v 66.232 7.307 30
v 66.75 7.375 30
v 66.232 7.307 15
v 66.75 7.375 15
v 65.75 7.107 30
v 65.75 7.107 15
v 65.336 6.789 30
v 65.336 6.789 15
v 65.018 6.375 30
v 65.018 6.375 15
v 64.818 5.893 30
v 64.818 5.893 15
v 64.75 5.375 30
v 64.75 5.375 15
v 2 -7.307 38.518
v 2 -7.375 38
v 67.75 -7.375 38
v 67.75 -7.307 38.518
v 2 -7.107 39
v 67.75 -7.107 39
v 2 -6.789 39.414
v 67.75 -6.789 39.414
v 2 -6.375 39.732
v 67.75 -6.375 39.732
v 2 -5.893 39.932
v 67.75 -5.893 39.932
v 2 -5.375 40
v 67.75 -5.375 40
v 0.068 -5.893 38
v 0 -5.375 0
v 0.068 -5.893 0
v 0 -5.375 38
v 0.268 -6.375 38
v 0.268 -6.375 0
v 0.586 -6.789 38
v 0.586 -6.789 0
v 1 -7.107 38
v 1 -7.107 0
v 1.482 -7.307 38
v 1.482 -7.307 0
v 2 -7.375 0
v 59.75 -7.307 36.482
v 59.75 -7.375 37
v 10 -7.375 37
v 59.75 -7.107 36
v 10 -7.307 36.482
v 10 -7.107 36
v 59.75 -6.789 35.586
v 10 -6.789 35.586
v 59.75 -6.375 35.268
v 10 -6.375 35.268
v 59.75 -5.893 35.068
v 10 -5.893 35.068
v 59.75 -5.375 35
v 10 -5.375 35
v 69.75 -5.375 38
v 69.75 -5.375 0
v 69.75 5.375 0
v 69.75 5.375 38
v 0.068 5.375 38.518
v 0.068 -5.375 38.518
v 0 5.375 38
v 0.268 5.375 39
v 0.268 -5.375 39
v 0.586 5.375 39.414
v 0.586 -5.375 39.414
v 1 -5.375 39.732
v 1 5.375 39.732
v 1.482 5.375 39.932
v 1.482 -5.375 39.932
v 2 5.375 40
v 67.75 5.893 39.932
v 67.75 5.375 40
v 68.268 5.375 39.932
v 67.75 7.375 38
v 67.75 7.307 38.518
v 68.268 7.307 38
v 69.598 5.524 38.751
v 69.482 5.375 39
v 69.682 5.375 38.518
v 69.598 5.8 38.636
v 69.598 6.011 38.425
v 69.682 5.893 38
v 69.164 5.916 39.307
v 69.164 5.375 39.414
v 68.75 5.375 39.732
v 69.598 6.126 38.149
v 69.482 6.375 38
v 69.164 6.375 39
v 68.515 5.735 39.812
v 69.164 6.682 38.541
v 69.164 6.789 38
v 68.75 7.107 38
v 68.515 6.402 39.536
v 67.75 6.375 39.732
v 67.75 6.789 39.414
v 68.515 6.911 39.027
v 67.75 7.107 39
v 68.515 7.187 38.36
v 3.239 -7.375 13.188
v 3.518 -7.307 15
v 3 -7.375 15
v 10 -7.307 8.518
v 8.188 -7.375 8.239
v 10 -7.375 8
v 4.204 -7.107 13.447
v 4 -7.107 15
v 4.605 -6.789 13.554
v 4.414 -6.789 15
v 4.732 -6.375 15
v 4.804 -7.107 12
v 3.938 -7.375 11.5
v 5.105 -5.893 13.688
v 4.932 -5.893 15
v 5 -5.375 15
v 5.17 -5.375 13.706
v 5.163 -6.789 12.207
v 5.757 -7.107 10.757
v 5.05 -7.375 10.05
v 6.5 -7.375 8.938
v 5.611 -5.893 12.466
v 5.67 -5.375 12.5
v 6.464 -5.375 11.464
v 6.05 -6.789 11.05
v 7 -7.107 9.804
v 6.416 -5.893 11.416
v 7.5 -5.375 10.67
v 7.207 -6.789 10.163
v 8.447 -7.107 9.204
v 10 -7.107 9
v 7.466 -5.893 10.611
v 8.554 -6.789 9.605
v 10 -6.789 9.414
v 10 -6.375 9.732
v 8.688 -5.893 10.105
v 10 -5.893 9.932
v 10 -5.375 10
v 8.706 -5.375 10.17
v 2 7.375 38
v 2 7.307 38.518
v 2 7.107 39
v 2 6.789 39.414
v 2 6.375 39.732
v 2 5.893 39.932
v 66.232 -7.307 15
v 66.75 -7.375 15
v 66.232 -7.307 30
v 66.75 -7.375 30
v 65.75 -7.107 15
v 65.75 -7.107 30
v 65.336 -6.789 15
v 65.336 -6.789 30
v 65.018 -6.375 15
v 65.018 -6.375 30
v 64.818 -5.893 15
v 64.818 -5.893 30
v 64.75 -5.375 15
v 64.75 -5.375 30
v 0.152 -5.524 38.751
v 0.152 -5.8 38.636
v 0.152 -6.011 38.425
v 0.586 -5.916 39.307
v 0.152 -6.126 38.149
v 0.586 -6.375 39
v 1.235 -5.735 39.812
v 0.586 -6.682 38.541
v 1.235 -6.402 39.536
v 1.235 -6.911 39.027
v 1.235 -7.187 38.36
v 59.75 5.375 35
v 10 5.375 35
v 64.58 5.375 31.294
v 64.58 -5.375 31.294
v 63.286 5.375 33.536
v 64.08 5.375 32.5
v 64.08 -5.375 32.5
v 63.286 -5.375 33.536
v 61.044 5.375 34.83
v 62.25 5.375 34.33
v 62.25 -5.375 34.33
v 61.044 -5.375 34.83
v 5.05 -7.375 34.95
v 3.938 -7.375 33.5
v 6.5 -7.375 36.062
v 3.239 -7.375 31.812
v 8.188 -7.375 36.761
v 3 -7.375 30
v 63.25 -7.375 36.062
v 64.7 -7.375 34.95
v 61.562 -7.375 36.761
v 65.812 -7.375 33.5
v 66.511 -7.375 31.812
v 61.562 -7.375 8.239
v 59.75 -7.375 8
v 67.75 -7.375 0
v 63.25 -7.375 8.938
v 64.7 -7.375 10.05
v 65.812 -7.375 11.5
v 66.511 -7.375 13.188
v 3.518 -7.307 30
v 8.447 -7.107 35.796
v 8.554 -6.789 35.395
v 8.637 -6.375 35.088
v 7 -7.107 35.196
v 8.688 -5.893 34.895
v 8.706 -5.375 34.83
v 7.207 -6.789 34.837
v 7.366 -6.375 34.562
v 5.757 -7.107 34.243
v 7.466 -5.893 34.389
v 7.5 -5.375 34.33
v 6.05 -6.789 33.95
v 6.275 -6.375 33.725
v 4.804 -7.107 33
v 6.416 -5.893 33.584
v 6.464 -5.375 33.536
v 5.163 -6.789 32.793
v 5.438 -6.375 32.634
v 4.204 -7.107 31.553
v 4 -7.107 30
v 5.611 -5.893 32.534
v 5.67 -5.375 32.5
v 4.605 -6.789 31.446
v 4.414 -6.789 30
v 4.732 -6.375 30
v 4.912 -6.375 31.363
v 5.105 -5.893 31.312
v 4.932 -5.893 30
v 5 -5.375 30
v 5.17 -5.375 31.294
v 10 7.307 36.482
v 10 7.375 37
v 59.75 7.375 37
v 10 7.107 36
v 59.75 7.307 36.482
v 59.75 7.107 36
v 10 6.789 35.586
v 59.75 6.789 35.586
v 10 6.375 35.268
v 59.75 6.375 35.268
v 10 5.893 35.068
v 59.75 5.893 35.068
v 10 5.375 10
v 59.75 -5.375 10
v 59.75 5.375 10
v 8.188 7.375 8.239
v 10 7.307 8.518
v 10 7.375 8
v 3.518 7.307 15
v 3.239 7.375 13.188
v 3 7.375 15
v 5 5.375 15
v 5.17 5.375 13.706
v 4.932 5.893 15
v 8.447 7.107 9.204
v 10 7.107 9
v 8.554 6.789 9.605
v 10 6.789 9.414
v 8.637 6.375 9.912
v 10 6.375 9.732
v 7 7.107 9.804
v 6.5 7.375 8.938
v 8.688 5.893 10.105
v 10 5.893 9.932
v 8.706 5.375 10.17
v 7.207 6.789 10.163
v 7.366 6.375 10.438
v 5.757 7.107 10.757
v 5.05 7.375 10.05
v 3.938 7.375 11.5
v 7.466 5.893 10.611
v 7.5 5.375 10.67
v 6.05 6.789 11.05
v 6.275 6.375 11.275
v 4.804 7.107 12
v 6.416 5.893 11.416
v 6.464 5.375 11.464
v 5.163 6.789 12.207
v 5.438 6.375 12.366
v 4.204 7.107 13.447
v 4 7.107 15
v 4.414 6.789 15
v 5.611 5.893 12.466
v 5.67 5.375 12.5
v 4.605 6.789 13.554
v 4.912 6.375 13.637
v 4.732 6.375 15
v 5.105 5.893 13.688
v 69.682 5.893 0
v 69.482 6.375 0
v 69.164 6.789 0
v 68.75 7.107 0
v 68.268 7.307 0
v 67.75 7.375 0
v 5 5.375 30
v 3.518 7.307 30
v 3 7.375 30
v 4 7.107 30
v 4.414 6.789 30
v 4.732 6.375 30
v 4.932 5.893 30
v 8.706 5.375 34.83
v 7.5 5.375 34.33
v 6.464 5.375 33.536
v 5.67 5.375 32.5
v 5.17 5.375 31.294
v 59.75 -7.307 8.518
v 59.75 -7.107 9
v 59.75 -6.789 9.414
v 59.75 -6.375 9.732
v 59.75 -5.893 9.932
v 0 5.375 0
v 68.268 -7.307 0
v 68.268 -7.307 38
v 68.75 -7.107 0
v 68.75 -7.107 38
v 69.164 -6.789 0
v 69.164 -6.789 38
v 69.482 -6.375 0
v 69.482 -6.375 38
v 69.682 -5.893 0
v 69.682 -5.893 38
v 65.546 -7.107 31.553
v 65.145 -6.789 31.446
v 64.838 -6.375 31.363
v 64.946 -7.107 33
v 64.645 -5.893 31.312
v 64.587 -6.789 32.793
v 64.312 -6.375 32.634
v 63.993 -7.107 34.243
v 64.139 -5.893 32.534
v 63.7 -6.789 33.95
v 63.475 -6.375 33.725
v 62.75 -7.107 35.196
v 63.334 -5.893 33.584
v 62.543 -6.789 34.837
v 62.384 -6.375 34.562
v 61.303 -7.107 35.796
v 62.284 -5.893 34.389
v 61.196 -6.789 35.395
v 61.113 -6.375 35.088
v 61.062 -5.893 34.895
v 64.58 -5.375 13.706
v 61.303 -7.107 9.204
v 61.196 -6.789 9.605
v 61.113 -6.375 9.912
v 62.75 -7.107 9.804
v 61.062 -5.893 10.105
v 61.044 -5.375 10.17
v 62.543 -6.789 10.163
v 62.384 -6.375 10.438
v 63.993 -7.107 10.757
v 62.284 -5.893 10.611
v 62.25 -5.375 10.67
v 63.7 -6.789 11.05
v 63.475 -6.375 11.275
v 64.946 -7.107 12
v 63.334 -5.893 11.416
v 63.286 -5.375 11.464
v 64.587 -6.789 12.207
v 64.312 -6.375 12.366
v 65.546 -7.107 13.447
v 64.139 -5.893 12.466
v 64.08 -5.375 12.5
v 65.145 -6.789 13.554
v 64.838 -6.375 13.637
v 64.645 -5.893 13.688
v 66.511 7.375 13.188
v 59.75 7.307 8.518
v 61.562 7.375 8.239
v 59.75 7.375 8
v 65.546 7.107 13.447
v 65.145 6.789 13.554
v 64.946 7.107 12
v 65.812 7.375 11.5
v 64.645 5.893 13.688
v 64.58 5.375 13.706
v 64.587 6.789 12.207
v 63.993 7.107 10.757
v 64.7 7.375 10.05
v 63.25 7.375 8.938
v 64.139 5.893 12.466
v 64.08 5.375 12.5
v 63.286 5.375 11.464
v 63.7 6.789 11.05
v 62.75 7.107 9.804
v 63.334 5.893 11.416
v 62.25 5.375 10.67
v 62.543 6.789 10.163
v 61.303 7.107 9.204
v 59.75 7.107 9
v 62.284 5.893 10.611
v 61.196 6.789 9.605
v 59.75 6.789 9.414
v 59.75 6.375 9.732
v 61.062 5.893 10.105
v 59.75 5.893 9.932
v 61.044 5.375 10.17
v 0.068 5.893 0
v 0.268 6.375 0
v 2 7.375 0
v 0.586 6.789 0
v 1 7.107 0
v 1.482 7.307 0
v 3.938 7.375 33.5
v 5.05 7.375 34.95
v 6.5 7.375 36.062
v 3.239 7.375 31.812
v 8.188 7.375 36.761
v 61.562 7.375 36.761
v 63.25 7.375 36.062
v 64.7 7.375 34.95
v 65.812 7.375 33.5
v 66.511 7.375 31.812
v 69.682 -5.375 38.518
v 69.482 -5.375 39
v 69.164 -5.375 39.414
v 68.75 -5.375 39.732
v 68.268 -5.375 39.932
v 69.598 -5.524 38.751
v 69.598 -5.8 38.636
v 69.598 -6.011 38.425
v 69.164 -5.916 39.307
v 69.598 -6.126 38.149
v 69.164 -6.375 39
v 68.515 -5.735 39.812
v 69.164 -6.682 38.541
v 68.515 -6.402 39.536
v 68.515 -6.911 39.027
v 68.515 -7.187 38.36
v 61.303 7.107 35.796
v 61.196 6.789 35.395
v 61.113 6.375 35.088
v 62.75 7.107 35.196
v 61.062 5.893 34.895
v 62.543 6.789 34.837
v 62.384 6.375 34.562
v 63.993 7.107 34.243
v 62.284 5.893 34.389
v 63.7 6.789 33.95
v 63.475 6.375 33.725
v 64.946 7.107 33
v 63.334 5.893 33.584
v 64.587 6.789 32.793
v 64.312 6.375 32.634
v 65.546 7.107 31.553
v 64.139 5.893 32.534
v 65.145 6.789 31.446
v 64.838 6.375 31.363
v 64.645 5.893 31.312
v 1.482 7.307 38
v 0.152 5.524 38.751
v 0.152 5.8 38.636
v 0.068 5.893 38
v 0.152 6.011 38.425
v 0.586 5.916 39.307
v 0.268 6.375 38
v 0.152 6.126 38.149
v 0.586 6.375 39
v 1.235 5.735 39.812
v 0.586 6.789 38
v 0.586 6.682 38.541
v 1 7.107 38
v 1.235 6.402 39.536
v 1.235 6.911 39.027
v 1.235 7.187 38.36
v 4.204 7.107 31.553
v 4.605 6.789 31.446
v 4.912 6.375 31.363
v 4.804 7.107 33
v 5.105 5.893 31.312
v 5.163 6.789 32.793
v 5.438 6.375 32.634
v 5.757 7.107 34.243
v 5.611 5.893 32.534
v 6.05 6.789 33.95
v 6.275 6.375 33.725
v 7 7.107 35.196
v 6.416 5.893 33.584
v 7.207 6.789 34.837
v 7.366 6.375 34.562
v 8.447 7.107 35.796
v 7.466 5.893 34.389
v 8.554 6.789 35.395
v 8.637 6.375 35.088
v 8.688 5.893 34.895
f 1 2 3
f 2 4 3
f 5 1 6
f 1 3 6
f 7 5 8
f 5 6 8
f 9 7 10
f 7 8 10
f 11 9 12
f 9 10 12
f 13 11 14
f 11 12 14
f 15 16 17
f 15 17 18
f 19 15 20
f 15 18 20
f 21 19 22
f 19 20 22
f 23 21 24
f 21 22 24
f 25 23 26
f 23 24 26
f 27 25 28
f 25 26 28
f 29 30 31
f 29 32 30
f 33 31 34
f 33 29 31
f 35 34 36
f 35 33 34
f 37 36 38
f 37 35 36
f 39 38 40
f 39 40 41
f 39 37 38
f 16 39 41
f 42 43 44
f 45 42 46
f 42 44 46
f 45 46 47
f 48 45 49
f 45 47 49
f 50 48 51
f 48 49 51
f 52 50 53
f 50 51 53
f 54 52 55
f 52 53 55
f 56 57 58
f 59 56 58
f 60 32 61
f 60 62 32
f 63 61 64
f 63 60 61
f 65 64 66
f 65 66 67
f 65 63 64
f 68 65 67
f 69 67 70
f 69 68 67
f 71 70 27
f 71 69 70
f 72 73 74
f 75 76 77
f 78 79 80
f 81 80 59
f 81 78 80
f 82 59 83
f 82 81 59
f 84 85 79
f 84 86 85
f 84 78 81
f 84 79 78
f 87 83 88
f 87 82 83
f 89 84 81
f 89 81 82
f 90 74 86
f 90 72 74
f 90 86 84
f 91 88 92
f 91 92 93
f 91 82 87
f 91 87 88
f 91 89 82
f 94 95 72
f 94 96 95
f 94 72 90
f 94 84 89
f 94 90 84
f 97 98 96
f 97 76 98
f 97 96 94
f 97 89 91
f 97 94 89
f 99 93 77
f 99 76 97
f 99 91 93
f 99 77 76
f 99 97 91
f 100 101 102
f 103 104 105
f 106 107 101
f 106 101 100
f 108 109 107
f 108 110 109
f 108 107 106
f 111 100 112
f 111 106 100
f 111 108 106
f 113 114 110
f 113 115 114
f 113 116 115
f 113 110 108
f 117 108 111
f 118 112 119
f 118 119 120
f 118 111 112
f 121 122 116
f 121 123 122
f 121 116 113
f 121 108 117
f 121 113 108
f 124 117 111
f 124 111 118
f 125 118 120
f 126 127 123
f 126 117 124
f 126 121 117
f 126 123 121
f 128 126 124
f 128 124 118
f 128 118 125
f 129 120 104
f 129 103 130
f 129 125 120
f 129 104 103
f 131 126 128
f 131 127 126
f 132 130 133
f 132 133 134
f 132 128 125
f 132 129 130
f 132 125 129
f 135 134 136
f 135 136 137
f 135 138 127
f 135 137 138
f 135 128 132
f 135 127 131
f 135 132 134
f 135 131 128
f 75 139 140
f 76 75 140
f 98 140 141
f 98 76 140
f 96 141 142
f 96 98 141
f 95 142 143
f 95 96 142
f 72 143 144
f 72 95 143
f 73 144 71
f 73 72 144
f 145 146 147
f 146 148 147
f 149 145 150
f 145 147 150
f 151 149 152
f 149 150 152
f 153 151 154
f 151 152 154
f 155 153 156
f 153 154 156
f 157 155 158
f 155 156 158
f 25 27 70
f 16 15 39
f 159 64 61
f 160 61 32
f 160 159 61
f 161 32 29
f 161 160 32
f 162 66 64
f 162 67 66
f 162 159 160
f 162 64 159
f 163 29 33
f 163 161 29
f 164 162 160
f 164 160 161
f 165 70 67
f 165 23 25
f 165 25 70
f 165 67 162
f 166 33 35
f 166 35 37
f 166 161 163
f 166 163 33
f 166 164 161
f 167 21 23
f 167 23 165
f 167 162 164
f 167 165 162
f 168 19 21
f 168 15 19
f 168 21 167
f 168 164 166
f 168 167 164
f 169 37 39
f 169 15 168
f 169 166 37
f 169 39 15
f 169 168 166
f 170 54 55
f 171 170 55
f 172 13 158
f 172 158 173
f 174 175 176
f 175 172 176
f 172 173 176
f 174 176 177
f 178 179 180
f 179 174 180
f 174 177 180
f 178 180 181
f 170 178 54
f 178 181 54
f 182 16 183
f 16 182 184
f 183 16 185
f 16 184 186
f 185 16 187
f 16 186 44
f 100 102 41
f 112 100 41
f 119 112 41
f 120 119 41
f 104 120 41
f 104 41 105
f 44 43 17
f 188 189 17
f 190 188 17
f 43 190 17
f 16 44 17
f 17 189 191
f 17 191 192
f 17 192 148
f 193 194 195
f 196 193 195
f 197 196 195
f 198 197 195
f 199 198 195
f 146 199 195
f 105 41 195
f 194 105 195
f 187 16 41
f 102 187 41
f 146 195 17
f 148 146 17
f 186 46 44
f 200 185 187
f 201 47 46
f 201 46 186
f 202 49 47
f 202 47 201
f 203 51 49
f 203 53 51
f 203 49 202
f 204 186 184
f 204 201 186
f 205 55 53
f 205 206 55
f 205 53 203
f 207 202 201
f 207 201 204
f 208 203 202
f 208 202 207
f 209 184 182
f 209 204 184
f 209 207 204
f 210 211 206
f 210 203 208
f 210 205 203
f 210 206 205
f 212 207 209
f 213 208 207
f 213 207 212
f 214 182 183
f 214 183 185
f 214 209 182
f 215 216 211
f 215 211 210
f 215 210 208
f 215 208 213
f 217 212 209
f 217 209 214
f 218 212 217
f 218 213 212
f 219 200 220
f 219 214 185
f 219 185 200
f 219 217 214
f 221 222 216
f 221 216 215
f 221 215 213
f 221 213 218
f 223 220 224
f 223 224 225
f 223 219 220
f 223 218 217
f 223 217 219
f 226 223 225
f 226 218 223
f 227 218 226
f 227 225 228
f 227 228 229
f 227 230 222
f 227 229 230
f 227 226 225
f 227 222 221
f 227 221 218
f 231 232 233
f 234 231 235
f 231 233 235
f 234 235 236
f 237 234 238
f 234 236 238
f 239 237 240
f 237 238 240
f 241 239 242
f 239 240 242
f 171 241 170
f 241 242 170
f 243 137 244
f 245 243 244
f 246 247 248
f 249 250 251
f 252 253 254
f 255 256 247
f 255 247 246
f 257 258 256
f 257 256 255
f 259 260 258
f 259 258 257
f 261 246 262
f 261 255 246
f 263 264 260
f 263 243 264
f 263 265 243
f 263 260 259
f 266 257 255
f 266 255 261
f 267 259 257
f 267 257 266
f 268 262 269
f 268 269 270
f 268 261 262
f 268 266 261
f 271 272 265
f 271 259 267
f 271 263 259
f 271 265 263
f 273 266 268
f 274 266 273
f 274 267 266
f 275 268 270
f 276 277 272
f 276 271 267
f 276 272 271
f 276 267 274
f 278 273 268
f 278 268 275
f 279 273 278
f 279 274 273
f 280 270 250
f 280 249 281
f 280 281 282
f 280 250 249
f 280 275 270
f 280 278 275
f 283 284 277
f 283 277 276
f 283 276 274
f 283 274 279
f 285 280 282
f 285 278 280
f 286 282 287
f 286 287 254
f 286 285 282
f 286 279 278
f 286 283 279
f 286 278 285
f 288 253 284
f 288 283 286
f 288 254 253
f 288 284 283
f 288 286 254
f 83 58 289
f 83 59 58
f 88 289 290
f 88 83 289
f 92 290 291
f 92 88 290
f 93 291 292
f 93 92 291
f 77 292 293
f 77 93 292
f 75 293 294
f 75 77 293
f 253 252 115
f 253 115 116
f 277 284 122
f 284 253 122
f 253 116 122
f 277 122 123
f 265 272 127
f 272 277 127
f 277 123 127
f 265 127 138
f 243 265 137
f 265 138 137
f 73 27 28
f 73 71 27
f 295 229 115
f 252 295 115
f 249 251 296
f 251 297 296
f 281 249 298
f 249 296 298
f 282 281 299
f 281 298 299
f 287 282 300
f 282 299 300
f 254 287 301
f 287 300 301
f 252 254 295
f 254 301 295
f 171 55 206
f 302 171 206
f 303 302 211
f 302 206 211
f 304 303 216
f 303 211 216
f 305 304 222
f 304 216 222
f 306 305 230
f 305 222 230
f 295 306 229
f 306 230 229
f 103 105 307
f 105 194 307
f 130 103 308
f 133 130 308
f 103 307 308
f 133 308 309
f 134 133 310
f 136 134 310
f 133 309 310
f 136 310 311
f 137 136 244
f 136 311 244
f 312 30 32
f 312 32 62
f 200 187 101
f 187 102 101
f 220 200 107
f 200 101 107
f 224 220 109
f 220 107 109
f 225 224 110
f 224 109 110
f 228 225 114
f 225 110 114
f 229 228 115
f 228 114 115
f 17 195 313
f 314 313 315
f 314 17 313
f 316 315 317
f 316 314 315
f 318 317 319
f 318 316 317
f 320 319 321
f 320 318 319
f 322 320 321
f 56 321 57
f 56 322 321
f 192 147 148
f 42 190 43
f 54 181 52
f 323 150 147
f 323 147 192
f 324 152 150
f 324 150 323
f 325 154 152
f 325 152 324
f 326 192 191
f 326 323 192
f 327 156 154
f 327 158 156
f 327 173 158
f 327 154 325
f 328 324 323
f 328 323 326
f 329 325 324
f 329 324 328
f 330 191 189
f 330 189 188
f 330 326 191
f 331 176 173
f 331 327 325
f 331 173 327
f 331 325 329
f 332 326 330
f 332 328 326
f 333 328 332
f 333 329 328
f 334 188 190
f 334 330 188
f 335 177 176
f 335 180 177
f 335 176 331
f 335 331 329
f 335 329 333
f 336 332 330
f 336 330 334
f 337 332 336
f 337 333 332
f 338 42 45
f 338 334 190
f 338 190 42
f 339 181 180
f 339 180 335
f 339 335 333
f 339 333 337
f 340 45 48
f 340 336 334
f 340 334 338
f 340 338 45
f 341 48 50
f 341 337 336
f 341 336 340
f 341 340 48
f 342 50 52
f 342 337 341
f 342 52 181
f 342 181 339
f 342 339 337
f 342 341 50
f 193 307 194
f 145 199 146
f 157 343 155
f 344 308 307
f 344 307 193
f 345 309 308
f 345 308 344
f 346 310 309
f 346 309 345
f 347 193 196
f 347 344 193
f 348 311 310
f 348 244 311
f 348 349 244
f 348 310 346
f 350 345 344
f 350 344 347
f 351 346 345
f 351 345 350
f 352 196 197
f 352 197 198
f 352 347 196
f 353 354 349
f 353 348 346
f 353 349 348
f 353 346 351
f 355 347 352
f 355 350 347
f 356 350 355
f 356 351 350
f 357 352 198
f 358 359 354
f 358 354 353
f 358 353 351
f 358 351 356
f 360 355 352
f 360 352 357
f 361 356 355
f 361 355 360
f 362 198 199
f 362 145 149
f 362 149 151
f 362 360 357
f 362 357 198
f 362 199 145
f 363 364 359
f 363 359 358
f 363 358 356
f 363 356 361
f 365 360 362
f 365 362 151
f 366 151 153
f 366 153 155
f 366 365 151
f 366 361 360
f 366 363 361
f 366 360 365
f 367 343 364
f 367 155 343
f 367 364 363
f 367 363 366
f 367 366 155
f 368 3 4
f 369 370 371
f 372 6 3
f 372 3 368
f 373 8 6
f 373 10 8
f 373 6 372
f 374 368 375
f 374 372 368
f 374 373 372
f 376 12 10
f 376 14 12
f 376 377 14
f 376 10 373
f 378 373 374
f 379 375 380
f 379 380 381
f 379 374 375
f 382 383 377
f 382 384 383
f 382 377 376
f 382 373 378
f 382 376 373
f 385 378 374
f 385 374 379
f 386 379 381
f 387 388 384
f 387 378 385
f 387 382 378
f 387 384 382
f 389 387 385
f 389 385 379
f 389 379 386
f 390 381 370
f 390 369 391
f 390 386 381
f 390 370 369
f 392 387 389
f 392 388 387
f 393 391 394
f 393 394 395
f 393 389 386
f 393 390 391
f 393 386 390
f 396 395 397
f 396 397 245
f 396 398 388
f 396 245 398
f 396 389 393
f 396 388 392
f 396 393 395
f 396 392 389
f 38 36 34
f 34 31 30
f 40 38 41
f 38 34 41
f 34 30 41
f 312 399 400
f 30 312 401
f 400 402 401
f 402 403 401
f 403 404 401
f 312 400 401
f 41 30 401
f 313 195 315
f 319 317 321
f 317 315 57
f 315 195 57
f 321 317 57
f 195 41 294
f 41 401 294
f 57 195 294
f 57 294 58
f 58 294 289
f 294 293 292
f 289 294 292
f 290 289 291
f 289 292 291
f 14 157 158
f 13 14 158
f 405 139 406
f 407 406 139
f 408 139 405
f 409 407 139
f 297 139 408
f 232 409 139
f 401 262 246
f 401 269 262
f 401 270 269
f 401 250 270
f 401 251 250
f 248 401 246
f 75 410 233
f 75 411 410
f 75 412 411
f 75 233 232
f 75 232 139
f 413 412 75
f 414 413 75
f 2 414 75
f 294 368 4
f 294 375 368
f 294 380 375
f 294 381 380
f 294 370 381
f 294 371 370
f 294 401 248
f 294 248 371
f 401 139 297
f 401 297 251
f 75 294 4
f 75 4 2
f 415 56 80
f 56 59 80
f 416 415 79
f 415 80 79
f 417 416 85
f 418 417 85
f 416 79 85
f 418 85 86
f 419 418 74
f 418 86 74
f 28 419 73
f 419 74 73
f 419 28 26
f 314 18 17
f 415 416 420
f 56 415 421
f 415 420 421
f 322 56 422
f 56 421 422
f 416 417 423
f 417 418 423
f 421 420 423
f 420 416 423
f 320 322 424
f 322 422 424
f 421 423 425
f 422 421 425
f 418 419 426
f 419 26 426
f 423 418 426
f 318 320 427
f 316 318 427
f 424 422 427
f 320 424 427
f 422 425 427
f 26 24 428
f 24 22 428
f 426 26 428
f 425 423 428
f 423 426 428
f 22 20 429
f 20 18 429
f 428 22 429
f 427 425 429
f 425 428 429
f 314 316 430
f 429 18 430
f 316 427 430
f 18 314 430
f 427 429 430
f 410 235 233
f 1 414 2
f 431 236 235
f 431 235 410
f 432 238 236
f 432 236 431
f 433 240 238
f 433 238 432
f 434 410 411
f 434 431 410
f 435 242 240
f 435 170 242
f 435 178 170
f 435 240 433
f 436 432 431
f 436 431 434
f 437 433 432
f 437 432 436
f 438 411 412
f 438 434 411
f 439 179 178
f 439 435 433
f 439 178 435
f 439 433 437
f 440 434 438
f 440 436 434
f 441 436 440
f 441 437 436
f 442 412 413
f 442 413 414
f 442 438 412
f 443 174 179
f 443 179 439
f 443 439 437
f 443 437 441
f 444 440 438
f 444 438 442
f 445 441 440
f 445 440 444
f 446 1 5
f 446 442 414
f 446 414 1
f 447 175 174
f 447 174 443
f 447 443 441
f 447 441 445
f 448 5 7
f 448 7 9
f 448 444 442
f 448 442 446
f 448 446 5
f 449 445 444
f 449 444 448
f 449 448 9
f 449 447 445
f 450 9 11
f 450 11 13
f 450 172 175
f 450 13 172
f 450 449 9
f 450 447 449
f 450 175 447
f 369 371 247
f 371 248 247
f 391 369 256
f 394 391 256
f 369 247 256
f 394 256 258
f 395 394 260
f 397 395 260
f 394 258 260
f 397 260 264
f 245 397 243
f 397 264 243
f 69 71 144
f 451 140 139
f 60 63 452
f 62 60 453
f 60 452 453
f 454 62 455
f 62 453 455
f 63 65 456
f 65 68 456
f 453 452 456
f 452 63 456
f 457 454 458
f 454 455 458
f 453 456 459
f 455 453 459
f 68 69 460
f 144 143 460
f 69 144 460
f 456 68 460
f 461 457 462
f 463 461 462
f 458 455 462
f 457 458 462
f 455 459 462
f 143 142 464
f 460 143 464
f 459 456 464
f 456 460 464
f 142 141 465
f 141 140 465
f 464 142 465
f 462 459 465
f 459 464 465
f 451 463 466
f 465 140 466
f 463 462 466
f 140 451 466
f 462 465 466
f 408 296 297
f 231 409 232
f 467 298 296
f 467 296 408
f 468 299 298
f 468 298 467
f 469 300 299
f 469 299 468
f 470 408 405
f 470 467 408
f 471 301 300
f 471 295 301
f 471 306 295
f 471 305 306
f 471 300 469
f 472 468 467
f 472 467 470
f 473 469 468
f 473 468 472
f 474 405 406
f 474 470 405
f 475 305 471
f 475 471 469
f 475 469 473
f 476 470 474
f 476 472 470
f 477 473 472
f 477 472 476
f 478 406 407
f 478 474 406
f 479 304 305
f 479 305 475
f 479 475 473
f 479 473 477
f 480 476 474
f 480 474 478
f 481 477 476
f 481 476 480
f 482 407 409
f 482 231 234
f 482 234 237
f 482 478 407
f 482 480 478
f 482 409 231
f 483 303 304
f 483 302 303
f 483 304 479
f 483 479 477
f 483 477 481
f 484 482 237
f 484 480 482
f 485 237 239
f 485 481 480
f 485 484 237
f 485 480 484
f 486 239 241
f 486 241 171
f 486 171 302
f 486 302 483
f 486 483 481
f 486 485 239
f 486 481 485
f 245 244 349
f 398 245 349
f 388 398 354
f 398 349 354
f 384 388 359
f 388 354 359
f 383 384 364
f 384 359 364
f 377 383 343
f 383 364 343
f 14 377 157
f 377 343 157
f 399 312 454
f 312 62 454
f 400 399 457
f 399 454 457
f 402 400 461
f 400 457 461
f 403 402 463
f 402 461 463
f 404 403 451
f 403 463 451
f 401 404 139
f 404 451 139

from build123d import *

# Parameters (mm, degrees)
F0_W     = 69.75
F0_H     = 14.75
F1_DEPTH = 40
F2_R     = 2
F4_DEPTH = 14.751
F7_R     = 2


with BuildPart() as f1:
    # F0 (on Top) → F1 (new body)
    with BuildSketch(Plane.XY):
        with Locations((34.875, 0)):
            Rectangle(F0_W, F0_H)
    extrude(amount=F1_DEPTH)

    # F2
    f2_edges = [f1.edges().sort_by_distance(p)[0] for p in [
        (34.875, -7.375, 40),
        (34.875, 7.375, 40),
        (69.75, 0, 40),
        (0, 0, 40),
        (69.75, -7.375, 20),
        (69.75, 7.375, 20),
        (0, -7.375, 20),
        (0, 7.375, 20),
    ]]
    fillet(f2_edges, radius=F2_R)

    # F3 (on face) → F4 (cut, through all)
    with BuildSketch(Plane.XZ.offset(7.375)):
        with BuildLine():
            Line((59.75, 35), (10, 35))
            ThreePointArc((10, 35), (6.464466, 33.535534), (5, 30))
            Line((5, 30), (5, 15))
            ThreePointArc((5, 15), (6.464466, 11.464466), (10, 10))
            Line((10, 10), (59.75, 10))
            ThreePointArc((59.75, 10), (63.285534, 11.464466), (64.75, 15))
            Line((64.75, 15), (64.75, 30))
            ThreePointArc((64.75, 30), (63.285534, 33.535534), (59.75, 35))
        make_face()
    extrude(amount=-F4_DEPTH, mode=Mode.SUBTRACT)

    # F7
    f7_edges = [f1.edges().sort_by_distance(p)[0] for p in [
        (34.875, -7.375, 10),
        (34.875, 7.375, 10),
    ]]
    fillet(f7_edges, radius=F7_R)


solid = f1.part
